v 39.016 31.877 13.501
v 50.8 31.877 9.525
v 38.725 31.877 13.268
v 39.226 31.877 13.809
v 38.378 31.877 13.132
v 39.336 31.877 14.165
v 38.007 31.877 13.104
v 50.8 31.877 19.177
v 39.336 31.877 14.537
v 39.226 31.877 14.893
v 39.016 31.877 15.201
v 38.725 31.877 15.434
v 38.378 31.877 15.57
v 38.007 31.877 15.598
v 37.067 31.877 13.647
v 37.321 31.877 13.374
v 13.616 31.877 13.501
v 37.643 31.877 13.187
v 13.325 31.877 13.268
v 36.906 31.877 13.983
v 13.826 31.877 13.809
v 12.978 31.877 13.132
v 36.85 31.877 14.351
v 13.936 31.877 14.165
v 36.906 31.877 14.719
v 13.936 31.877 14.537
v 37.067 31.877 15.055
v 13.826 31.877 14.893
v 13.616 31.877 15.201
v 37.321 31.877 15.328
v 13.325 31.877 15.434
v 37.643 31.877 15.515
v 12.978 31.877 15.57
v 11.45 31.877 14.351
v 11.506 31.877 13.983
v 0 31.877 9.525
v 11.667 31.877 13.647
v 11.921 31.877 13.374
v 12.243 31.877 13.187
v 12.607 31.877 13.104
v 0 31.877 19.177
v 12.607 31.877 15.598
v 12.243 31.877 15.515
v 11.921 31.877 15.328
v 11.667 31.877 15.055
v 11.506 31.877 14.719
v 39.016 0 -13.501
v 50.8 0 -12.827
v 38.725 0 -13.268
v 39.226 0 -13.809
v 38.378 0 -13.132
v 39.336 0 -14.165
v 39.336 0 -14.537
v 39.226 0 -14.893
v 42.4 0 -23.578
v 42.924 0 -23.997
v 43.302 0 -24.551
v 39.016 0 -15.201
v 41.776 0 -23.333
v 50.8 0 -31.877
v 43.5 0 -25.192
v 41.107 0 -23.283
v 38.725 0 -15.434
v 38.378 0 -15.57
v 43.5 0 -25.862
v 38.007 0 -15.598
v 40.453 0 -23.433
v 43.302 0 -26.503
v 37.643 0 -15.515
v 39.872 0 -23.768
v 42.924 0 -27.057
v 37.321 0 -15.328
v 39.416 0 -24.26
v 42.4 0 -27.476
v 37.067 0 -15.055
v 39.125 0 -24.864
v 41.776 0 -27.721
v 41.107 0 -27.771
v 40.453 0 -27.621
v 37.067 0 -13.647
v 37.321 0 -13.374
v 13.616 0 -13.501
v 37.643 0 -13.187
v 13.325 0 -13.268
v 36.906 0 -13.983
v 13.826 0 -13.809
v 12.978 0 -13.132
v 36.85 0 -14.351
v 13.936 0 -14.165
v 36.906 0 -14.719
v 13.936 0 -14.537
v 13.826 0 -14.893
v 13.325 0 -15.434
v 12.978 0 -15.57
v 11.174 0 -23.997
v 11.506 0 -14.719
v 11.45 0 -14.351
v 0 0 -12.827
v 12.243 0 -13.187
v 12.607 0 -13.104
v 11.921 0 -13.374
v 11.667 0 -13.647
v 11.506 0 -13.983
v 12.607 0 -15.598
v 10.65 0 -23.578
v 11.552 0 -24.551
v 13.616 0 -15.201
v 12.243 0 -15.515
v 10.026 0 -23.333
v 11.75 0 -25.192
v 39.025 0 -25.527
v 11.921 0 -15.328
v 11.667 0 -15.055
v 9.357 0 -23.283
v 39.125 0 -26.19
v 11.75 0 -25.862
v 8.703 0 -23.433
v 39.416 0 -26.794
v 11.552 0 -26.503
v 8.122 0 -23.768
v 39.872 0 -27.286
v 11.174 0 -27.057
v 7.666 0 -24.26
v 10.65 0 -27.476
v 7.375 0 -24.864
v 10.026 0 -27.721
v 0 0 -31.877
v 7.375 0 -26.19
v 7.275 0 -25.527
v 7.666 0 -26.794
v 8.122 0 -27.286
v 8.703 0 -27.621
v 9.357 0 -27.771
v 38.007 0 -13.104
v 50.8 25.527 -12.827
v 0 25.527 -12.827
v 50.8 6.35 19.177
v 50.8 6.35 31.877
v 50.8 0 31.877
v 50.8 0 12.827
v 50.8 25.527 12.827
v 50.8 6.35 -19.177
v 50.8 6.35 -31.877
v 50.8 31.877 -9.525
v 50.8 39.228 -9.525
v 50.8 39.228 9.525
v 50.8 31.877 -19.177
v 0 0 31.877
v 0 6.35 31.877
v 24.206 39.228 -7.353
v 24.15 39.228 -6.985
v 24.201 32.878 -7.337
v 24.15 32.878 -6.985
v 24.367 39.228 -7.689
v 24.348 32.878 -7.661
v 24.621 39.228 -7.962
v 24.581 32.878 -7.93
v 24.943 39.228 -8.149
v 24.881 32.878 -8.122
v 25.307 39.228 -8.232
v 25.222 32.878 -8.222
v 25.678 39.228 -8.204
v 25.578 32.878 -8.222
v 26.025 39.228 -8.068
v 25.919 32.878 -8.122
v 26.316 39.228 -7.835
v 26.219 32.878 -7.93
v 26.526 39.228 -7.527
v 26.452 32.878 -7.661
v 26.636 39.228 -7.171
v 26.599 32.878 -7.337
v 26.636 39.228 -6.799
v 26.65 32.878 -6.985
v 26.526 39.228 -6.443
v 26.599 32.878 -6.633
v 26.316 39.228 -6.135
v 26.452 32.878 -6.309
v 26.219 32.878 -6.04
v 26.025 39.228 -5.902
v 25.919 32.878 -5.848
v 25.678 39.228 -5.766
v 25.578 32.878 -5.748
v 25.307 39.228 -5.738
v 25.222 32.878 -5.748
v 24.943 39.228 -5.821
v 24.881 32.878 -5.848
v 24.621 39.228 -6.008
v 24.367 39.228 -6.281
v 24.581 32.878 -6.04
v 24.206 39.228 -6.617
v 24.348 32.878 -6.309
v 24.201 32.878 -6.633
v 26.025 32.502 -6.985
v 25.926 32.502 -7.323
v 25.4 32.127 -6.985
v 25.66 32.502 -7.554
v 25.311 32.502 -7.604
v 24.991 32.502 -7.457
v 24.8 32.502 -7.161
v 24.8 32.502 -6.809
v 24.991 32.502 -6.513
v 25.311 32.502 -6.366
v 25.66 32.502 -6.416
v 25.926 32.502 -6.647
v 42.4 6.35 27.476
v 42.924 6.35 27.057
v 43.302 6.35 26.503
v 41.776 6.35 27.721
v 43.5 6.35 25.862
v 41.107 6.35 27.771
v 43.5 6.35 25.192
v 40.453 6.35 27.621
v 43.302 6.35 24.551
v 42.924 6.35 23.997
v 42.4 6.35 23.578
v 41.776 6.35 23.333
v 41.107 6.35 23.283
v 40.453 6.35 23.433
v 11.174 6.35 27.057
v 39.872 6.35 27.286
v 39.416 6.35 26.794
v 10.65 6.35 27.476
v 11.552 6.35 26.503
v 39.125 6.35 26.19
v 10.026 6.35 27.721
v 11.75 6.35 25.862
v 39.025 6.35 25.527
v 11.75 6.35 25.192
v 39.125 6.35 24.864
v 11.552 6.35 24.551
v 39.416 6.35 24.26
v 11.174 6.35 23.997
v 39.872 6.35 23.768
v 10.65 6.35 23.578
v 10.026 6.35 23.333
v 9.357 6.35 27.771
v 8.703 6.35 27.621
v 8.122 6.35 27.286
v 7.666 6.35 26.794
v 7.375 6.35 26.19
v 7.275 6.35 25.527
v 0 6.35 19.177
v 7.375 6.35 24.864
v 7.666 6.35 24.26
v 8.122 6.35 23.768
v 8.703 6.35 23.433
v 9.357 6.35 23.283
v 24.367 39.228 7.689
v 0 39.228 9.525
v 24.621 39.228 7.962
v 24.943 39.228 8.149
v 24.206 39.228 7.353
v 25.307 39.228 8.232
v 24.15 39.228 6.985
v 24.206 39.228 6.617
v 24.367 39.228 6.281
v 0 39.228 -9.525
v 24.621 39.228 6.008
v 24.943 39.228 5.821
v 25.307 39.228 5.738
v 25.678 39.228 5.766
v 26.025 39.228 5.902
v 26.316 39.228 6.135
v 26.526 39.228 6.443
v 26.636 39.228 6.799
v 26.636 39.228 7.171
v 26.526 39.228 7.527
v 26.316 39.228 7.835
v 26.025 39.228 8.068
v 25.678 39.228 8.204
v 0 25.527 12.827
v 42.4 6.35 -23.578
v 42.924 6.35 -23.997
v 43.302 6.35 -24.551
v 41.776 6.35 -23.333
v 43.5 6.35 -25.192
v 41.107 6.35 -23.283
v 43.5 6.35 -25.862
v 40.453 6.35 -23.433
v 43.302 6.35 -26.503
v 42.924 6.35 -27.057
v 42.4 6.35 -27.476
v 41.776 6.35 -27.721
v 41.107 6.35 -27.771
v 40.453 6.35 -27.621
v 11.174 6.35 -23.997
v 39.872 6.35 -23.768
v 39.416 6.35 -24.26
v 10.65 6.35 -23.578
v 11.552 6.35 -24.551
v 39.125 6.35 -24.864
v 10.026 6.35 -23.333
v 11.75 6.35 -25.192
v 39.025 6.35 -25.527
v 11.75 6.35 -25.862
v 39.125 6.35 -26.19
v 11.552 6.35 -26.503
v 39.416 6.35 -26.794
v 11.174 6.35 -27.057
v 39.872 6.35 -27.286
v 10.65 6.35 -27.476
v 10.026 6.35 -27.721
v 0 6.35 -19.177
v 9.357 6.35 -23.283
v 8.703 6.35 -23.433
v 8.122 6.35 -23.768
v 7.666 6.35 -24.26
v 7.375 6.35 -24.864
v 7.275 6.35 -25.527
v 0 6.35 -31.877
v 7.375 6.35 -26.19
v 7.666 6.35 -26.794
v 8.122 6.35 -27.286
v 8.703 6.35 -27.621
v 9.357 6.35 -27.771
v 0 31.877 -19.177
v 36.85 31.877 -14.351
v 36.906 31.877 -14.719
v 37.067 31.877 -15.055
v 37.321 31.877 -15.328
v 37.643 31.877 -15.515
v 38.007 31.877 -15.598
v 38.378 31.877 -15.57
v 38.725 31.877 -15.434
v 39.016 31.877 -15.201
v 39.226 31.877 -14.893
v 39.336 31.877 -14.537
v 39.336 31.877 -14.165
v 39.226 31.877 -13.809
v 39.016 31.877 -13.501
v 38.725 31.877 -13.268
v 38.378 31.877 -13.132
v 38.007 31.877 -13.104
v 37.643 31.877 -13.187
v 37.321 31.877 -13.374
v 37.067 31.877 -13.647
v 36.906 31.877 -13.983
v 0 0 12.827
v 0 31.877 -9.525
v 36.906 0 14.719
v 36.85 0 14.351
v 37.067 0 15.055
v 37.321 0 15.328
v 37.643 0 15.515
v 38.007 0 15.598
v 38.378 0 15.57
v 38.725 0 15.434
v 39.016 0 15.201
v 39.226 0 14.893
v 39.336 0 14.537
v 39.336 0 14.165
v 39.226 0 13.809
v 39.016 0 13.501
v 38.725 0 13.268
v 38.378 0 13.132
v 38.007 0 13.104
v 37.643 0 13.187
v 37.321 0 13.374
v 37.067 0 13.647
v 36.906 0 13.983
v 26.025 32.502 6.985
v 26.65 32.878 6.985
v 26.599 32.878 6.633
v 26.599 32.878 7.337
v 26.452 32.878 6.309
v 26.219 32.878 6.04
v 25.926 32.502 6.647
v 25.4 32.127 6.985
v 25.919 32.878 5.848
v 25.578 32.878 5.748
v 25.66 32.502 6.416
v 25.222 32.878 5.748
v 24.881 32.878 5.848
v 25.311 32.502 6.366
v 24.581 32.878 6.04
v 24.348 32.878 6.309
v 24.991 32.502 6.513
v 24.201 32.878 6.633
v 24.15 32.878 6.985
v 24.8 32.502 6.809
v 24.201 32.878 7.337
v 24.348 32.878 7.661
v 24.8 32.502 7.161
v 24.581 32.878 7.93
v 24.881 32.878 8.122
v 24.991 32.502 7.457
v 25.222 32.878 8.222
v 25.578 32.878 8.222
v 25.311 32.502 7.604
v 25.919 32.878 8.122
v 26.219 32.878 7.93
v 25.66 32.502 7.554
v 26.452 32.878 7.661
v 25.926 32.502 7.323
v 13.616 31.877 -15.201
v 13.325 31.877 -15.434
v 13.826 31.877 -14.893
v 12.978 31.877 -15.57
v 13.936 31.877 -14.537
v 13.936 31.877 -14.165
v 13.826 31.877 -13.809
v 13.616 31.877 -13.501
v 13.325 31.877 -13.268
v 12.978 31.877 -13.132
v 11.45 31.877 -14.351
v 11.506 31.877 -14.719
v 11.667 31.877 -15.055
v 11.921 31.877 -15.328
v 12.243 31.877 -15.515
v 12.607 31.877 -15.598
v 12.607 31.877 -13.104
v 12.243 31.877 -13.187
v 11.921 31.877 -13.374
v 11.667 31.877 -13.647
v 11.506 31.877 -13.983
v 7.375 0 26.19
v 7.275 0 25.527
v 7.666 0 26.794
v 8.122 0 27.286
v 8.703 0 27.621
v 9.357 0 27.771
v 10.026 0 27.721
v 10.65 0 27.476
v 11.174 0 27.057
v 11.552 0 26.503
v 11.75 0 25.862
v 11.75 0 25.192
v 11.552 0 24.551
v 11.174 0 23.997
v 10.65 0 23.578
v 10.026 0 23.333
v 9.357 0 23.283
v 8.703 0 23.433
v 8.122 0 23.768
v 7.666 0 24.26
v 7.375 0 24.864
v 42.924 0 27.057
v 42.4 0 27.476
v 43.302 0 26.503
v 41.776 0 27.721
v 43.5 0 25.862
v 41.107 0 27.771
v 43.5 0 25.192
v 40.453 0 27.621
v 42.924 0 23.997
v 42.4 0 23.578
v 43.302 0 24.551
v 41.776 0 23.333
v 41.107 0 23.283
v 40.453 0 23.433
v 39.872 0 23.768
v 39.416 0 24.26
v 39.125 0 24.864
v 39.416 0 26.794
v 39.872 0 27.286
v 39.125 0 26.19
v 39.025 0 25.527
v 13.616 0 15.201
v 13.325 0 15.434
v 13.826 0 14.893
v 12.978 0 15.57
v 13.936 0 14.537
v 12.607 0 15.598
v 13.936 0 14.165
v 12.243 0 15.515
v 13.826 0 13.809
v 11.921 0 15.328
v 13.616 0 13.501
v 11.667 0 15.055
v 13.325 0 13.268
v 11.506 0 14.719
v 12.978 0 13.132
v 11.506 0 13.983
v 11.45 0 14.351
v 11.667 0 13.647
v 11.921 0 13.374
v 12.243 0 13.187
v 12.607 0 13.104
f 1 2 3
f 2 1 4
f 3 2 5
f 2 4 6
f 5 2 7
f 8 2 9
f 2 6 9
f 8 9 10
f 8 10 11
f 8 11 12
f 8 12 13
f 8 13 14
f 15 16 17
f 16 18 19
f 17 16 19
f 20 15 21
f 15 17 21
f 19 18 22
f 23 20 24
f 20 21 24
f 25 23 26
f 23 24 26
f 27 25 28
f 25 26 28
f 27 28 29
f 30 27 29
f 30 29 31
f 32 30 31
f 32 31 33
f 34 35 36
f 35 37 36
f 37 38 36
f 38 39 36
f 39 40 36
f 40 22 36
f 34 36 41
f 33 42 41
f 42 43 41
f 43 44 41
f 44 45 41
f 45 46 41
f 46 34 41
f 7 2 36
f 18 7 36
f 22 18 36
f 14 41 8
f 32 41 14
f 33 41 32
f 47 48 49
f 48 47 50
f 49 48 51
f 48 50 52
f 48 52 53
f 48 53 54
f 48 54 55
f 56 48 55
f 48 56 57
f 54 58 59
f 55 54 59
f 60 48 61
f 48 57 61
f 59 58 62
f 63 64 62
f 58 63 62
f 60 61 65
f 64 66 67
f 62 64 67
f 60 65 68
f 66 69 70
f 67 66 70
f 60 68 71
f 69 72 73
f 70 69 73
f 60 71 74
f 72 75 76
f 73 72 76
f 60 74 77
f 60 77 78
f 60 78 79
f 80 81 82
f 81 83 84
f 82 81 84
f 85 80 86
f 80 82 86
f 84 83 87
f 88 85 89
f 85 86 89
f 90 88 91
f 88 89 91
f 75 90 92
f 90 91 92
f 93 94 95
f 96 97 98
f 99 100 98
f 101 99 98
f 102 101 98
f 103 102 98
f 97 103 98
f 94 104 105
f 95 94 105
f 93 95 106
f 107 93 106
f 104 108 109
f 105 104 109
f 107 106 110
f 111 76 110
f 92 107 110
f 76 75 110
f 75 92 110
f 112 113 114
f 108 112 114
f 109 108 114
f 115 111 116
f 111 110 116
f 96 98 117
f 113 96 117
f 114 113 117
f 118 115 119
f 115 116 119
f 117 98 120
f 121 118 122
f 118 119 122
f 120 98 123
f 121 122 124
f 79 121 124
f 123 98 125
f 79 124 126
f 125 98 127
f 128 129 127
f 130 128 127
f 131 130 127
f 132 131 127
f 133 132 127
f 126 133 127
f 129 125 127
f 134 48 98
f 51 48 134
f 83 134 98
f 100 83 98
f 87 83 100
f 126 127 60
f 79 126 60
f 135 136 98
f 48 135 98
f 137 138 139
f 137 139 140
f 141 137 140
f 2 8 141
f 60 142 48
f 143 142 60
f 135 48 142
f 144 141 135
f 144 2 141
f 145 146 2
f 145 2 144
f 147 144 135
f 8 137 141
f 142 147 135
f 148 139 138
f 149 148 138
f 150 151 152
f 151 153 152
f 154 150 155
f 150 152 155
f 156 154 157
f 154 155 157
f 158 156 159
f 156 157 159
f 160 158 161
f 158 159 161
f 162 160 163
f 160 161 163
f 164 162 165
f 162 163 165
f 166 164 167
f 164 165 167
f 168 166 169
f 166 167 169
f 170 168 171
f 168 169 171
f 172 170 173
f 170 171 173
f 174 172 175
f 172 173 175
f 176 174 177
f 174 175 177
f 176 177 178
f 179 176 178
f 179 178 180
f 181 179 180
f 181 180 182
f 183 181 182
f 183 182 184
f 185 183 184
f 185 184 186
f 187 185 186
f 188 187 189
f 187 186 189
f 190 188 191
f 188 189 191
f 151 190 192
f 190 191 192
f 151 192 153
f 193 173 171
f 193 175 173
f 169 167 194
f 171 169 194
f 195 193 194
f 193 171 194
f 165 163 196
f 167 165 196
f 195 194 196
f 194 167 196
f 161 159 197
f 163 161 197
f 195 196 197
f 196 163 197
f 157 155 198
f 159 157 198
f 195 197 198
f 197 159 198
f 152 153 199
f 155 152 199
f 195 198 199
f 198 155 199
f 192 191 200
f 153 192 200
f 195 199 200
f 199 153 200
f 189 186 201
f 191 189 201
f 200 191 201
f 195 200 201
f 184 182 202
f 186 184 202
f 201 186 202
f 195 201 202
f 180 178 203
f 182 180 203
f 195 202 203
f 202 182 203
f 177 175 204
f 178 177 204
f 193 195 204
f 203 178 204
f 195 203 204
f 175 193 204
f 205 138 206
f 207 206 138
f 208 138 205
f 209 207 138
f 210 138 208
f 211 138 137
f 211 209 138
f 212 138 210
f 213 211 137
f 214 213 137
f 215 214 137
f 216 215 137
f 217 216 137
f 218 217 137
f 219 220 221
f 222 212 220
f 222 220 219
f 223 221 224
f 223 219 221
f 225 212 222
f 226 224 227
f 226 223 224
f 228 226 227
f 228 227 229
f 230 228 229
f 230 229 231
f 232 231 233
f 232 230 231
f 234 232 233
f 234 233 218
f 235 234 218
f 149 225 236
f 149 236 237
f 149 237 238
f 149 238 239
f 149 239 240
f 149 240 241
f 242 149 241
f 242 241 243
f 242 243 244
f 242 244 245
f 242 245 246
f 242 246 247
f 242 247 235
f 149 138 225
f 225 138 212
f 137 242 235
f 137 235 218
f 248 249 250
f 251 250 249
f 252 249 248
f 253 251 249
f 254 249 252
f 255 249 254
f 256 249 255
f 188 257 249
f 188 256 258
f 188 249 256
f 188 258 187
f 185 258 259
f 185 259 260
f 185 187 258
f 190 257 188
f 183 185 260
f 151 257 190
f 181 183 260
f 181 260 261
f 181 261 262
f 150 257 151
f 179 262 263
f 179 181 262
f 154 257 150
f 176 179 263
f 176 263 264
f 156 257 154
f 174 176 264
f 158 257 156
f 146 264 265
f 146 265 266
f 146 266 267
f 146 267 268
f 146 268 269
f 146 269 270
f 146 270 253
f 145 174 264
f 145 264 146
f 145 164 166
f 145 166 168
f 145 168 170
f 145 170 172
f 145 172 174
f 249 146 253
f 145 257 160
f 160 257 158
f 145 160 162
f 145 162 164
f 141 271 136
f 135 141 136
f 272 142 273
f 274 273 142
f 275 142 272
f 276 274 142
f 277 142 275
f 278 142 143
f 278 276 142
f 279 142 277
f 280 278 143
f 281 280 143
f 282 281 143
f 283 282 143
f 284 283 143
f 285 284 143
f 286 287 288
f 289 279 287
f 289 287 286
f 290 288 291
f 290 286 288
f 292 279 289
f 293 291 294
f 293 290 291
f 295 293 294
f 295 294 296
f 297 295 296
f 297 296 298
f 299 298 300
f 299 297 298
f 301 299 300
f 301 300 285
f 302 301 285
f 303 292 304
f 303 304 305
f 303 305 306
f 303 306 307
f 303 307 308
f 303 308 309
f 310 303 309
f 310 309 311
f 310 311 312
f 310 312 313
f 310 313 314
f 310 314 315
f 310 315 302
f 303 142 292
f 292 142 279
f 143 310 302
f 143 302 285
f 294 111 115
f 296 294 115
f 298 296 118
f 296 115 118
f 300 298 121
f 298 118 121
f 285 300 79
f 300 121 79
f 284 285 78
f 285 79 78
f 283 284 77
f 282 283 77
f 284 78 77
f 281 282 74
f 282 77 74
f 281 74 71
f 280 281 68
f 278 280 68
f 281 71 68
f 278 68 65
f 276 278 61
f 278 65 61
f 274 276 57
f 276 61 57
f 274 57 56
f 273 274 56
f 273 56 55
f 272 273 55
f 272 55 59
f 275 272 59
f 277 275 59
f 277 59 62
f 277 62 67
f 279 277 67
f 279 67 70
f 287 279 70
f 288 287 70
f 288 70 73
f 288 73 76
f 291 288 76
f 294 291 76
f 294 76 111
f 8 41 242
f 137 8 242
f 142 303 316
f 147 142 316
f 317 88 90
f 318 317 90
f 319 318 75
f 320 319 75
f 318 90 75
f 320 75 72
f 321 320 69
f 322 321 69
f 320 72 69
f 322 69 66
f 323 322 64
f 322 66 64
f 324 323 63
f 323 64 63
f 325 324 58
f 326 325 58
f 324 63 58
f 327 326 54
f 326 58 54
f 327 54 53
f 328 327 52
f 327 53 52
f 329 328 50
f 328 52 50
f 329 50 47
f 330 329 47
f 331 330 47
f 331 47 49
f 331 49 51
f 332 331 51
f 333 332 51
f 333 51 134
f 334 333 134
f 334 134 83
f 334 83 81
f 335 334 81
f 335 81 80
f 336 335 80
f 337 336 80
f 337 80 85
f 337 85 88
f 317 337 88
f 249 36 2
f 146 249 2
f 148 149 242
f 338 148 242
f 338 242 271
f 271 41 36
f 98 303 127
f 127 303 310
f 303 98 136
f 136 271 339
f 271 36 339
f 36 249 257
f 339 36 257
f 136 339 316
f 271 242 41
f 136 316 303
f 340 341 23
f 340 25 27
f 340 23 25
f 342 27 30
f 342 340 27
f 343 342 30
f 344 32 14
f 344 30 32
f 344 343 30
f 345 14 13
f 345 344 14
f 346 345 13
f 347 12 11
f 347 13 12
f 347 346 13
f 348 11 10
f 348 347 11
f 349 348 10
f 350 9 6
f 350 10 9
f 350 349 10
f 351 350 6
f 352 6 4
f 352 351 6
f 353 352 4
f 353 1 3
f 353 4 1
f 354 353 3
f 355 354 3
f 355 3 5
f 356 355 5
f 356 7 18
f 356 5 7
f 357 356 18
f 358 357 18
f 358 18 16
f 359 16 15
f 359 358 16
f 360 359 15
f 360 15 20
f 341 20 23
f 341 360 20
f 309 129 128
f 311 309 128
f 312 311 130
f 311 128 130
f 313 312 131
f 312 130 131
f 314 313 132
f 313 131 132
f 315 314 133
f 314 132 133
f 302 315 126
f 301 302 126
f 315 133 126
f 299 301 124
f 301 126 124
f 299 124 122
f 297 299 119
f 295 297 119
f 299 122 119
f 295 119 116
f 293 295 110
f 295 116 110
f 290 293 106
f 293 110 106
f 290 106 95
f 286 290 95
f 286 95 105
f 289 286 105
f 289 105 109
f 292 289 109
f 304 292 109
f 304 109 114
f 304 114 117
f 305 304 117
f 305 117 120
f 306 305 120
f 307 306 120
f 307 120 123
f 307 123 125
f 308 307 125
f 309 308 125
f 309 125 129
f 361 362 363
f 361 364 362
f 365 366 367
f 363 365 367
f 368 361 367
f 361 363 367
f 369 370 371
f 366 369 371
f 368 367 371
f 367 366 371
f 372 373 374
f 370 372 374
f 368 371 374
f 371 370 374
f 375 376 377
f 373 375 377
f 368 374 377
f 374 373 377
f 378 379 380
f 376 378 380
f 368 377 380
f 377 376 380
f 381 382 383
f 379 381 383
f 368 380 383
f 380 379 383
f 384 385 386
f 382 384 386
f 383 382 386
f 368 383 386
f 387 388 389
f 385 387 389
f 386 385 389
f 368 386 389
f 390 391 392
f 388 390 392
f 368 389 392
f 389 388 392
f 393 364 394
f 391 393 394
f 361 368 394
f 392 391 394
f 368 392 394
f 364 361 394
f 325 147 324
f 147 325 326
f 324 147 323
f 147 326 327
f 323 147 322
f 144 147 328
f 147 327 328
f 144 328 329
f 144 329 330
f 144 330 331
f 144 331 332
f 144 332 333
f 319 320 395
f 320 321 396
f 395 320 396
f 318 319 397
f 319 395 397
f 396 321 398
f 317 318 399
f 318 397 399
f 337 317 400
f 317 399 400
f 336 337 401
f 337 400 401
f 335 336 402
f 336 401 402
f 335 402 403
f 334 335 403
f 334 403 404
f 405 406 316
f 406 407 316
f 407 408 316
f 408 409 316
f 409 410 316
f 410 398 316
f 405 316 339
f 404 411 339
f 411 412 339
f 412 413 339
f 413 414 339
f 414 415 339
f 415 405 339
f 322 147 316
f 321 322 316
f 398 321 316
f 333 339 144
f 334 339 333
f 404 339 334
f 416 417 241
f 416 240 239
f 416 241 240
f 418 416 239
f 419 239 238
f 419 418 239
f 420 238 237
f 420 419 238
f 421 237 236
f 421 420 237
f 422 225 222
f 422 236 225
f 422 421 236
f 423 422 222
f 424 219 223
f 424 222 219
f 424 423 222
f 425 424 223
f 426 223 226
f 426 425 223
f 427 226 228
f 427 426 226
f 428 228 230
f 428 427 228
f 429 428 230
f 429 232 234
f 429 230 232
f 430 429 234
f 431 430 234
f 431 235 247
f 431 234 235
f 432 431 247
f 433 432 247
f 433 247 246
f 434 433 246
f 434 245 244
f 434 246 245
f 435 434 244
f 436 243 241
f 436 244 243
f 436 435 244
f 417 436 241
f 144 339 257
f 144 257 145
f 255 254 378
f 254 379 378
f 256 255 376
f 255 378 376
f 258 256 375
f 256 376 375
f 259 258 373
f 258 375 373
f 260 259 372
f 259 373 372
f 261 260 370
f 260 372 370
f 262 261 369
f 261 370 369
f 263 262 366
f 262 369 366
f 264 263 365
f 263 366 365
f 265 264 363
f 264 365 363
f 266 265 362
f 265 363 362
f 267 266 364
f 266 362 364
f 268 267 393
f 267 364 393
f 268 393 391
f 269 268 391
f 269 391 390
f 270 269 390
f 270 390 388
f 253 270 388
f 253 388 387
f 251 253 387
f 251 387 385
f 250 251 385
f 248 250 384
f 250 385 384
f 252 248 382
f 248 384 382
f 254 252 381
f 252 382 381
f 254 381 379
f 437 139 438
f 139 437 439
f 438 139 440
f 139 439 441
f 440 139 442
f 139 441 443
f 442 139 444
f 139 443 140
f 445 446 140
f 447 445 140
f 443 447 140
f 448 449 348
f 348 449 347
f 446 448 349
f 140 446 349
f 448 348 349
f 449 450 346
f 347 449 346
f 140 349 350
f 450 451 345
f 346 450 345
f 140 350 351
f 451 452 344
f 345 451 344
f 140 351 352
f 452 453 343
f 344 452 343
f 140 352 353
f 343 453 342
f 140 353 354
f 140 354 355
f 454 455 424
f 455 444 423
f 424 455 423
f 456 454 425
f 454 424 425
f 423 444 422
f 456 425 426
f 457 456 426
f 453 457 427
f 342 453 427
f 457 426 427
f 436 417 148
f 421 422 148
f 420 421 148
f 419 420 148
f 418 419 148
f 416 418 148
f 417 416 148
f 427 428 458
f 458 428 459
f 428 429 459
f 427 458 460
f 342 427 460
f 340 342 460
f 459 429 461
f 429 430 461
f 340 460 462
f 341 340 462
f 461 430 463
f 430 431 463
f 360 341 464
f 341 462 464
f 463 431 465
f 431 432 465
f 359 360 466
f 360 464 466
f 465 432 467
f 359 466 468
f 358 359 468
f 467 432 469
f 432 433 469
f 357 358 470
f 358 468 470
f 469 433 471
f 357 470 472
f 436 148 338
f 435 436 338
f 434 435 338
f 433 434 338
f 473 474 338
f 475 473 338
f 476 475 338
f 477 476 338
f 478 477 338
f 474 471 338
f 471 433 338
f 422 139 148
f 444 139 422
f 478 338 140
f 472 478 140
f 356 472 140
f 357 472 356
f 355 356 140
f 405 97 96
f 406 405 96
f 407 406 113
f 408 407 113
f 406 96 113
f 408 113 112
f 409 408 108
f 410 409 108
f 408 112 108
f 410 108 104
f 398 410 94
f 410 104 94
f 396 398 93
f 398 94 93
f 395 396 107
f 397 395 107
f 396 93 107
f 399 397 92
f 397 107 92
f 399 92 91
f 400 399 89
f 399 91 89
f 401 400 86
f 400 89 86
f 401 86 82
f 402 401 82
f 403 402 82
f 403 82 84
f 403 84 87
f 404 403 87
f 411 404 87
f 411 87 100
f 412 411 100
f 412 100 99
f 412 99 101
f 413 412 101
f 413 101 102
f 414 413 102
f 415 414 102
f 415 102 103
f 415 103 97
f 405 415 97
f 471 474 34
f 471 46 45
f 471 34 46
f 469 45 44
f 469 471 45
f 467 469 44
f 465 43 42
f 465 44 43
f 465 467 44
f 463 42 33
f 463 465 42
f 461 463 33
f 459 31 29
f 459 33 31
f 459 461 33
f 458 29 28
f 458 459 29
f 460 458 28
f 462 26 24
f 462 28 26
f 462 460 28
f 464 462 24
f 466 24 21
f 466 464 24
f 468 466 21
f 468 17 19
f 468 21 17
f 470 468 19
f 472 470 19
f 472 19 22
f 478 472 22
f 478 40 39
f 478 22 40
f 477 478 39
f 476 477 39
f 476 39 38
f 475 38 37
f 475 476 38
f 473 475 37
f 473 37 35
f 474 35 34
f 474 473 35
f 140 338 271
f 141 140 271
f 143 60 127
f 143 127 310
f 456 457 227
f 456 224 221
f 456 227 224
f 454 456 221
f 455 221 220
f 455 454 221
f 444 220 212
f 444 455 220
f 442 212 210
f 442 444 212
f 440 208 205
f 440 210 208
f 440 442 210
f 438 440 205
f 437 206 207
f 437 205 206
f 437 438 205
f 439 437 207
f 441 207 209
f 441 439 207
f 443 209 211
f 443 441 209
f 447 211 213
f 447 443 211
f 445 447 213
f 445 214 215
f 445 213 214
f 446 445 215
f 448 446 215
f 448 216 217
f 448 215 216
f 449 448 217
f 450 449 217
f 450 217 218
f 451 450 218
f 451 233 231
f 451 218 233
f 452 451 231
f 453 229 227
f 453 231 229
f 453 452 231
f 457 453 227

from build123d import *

# Parameters (mm, degrees)
SKETCH1_W                 = 12.7
SKETCH1_H                 = 6.35
BOSS_EXTRUDE1_DEPTH       = 50.8
SKETCH2_W                 = 50.8
SKETCH2_H                 = 19.05
BOSS_EXTRUDE2_DEPTH       = 7.35076
M3X0_5_TAPPED_HOLE1_D     = 2.5
M3X0_5_TAPPED_HOLE1_DEPTH = 6.35
M3X0_5_TAPPED_HOLE1_TIP   = 0.751075774
M3X0_5_TAPPED_HOLE2_D     = 2.5
M4_CLEARANCE_HOLE1_D      = 4.5


with BuildPart() as part:
    # Sketch1 → Boss-Extrude1 (new body)
    with BuildSketch(Plane(origin=(0, 0, 0), x_dir=(0, 0, -1), z_dir=(1, 0, 0))):
        Polygon((19.177, 6.35), (19.177, 31.877), (0, 31.877), (0, 25.527), (12.827, 25.527), (12.827, 0), (19.177, 0), align=None)
        with Locations((25.527, 3.175)):
            Rectangle(SKETCH1_W, SKETCH1_H)
        Polygon((0, 25.527), (0, 31.877), (-19.177, 31.877), (-19.177, 6.35), (-19.177, 0), (-12.827, 0), (-12.827, 25.527), align=None)
        with Locations((-25.527, 3.175)):
            Rectangle(SKETCH1_W, SKETCH1_H)
    extrude(amount=BOSS_EXTRUDE1_DEPTH)

    # Sketch2 → Boss-Extrude2 (add)
    with BuildSketch(Plane(origin=(0, 31.877, 0), x_dir=(1, 0, 0), z_dir=(0, 1, 0))):
        with Locations((25.4, 0)):
            Rectangle(SKETCH2_W, SKETCH2_H)
    extrude(amount=BOSS_EXTRUDE2_DEPTH)

    # M3x0.5 Tapped Hole1
    with Locations(Plane(origin=(0, 39.22776, 0), x_dir=(1, 0, 0), z_dir=(0, 1, 0))):
        with Locations((25.4, -6.985), (25.4, 6.985)):
            Hole(M3X0_5_TAPPED_HOLE1_D / 2, depth=M3X0_5_TAPPED_HOLE1_DEPTH)
            with Locations((0, 0, -(M3X0_5_TAPPED_HOLE1_DEPTH + M3X0_5_TAPPED_HOLE1_TIP / 2))):  # 118° drill point
                Cone(0, M3X0_5_TAPPED_HOLE1_D / 2, M3X0_5_TAPPED_HOLE1_TIP, mode=Mode.SUBTRACT)

    # M3x0.5 Tapped Hole2 (through all)
    with Locations(Plane(origin=(0, 31.877, 0), x_dir=(1, 0, 0), z_dir=(0, 1, 0))):
        with Locations((38.1, 14.351), (12.7, 14.351)):
            m3x0_5_tapped_hole2 = Hole(M3X0_5_TAPPED_HOLE2_D / 2)

    # Mirror1: M3x0.5 Tapped Hole2 across plane
    add(m3x0_5_tapped_hole2.mirror(Plane.XY), mode=Mode.SUBTRACT)

    # M4 Clearance Hole1 (through all)
    with Locations(Plane(origin=(0, 6.35, 0), x_dir=(1, 0, 0), z_dir=(0, 1, 0))):
        with Locations((41.275, 25.527), (9.525, 25.527)):
            m4_clearance_hole1 = Hole(M4_CLEARANCE_HOLE1_D / 2)

    # Mirror2: M4 Clearance Hole1 across plane
    add(m4_clearance_hole1.mirror(Plane.XY), mode=Mode.SUBTRACT)


solid = part.part
